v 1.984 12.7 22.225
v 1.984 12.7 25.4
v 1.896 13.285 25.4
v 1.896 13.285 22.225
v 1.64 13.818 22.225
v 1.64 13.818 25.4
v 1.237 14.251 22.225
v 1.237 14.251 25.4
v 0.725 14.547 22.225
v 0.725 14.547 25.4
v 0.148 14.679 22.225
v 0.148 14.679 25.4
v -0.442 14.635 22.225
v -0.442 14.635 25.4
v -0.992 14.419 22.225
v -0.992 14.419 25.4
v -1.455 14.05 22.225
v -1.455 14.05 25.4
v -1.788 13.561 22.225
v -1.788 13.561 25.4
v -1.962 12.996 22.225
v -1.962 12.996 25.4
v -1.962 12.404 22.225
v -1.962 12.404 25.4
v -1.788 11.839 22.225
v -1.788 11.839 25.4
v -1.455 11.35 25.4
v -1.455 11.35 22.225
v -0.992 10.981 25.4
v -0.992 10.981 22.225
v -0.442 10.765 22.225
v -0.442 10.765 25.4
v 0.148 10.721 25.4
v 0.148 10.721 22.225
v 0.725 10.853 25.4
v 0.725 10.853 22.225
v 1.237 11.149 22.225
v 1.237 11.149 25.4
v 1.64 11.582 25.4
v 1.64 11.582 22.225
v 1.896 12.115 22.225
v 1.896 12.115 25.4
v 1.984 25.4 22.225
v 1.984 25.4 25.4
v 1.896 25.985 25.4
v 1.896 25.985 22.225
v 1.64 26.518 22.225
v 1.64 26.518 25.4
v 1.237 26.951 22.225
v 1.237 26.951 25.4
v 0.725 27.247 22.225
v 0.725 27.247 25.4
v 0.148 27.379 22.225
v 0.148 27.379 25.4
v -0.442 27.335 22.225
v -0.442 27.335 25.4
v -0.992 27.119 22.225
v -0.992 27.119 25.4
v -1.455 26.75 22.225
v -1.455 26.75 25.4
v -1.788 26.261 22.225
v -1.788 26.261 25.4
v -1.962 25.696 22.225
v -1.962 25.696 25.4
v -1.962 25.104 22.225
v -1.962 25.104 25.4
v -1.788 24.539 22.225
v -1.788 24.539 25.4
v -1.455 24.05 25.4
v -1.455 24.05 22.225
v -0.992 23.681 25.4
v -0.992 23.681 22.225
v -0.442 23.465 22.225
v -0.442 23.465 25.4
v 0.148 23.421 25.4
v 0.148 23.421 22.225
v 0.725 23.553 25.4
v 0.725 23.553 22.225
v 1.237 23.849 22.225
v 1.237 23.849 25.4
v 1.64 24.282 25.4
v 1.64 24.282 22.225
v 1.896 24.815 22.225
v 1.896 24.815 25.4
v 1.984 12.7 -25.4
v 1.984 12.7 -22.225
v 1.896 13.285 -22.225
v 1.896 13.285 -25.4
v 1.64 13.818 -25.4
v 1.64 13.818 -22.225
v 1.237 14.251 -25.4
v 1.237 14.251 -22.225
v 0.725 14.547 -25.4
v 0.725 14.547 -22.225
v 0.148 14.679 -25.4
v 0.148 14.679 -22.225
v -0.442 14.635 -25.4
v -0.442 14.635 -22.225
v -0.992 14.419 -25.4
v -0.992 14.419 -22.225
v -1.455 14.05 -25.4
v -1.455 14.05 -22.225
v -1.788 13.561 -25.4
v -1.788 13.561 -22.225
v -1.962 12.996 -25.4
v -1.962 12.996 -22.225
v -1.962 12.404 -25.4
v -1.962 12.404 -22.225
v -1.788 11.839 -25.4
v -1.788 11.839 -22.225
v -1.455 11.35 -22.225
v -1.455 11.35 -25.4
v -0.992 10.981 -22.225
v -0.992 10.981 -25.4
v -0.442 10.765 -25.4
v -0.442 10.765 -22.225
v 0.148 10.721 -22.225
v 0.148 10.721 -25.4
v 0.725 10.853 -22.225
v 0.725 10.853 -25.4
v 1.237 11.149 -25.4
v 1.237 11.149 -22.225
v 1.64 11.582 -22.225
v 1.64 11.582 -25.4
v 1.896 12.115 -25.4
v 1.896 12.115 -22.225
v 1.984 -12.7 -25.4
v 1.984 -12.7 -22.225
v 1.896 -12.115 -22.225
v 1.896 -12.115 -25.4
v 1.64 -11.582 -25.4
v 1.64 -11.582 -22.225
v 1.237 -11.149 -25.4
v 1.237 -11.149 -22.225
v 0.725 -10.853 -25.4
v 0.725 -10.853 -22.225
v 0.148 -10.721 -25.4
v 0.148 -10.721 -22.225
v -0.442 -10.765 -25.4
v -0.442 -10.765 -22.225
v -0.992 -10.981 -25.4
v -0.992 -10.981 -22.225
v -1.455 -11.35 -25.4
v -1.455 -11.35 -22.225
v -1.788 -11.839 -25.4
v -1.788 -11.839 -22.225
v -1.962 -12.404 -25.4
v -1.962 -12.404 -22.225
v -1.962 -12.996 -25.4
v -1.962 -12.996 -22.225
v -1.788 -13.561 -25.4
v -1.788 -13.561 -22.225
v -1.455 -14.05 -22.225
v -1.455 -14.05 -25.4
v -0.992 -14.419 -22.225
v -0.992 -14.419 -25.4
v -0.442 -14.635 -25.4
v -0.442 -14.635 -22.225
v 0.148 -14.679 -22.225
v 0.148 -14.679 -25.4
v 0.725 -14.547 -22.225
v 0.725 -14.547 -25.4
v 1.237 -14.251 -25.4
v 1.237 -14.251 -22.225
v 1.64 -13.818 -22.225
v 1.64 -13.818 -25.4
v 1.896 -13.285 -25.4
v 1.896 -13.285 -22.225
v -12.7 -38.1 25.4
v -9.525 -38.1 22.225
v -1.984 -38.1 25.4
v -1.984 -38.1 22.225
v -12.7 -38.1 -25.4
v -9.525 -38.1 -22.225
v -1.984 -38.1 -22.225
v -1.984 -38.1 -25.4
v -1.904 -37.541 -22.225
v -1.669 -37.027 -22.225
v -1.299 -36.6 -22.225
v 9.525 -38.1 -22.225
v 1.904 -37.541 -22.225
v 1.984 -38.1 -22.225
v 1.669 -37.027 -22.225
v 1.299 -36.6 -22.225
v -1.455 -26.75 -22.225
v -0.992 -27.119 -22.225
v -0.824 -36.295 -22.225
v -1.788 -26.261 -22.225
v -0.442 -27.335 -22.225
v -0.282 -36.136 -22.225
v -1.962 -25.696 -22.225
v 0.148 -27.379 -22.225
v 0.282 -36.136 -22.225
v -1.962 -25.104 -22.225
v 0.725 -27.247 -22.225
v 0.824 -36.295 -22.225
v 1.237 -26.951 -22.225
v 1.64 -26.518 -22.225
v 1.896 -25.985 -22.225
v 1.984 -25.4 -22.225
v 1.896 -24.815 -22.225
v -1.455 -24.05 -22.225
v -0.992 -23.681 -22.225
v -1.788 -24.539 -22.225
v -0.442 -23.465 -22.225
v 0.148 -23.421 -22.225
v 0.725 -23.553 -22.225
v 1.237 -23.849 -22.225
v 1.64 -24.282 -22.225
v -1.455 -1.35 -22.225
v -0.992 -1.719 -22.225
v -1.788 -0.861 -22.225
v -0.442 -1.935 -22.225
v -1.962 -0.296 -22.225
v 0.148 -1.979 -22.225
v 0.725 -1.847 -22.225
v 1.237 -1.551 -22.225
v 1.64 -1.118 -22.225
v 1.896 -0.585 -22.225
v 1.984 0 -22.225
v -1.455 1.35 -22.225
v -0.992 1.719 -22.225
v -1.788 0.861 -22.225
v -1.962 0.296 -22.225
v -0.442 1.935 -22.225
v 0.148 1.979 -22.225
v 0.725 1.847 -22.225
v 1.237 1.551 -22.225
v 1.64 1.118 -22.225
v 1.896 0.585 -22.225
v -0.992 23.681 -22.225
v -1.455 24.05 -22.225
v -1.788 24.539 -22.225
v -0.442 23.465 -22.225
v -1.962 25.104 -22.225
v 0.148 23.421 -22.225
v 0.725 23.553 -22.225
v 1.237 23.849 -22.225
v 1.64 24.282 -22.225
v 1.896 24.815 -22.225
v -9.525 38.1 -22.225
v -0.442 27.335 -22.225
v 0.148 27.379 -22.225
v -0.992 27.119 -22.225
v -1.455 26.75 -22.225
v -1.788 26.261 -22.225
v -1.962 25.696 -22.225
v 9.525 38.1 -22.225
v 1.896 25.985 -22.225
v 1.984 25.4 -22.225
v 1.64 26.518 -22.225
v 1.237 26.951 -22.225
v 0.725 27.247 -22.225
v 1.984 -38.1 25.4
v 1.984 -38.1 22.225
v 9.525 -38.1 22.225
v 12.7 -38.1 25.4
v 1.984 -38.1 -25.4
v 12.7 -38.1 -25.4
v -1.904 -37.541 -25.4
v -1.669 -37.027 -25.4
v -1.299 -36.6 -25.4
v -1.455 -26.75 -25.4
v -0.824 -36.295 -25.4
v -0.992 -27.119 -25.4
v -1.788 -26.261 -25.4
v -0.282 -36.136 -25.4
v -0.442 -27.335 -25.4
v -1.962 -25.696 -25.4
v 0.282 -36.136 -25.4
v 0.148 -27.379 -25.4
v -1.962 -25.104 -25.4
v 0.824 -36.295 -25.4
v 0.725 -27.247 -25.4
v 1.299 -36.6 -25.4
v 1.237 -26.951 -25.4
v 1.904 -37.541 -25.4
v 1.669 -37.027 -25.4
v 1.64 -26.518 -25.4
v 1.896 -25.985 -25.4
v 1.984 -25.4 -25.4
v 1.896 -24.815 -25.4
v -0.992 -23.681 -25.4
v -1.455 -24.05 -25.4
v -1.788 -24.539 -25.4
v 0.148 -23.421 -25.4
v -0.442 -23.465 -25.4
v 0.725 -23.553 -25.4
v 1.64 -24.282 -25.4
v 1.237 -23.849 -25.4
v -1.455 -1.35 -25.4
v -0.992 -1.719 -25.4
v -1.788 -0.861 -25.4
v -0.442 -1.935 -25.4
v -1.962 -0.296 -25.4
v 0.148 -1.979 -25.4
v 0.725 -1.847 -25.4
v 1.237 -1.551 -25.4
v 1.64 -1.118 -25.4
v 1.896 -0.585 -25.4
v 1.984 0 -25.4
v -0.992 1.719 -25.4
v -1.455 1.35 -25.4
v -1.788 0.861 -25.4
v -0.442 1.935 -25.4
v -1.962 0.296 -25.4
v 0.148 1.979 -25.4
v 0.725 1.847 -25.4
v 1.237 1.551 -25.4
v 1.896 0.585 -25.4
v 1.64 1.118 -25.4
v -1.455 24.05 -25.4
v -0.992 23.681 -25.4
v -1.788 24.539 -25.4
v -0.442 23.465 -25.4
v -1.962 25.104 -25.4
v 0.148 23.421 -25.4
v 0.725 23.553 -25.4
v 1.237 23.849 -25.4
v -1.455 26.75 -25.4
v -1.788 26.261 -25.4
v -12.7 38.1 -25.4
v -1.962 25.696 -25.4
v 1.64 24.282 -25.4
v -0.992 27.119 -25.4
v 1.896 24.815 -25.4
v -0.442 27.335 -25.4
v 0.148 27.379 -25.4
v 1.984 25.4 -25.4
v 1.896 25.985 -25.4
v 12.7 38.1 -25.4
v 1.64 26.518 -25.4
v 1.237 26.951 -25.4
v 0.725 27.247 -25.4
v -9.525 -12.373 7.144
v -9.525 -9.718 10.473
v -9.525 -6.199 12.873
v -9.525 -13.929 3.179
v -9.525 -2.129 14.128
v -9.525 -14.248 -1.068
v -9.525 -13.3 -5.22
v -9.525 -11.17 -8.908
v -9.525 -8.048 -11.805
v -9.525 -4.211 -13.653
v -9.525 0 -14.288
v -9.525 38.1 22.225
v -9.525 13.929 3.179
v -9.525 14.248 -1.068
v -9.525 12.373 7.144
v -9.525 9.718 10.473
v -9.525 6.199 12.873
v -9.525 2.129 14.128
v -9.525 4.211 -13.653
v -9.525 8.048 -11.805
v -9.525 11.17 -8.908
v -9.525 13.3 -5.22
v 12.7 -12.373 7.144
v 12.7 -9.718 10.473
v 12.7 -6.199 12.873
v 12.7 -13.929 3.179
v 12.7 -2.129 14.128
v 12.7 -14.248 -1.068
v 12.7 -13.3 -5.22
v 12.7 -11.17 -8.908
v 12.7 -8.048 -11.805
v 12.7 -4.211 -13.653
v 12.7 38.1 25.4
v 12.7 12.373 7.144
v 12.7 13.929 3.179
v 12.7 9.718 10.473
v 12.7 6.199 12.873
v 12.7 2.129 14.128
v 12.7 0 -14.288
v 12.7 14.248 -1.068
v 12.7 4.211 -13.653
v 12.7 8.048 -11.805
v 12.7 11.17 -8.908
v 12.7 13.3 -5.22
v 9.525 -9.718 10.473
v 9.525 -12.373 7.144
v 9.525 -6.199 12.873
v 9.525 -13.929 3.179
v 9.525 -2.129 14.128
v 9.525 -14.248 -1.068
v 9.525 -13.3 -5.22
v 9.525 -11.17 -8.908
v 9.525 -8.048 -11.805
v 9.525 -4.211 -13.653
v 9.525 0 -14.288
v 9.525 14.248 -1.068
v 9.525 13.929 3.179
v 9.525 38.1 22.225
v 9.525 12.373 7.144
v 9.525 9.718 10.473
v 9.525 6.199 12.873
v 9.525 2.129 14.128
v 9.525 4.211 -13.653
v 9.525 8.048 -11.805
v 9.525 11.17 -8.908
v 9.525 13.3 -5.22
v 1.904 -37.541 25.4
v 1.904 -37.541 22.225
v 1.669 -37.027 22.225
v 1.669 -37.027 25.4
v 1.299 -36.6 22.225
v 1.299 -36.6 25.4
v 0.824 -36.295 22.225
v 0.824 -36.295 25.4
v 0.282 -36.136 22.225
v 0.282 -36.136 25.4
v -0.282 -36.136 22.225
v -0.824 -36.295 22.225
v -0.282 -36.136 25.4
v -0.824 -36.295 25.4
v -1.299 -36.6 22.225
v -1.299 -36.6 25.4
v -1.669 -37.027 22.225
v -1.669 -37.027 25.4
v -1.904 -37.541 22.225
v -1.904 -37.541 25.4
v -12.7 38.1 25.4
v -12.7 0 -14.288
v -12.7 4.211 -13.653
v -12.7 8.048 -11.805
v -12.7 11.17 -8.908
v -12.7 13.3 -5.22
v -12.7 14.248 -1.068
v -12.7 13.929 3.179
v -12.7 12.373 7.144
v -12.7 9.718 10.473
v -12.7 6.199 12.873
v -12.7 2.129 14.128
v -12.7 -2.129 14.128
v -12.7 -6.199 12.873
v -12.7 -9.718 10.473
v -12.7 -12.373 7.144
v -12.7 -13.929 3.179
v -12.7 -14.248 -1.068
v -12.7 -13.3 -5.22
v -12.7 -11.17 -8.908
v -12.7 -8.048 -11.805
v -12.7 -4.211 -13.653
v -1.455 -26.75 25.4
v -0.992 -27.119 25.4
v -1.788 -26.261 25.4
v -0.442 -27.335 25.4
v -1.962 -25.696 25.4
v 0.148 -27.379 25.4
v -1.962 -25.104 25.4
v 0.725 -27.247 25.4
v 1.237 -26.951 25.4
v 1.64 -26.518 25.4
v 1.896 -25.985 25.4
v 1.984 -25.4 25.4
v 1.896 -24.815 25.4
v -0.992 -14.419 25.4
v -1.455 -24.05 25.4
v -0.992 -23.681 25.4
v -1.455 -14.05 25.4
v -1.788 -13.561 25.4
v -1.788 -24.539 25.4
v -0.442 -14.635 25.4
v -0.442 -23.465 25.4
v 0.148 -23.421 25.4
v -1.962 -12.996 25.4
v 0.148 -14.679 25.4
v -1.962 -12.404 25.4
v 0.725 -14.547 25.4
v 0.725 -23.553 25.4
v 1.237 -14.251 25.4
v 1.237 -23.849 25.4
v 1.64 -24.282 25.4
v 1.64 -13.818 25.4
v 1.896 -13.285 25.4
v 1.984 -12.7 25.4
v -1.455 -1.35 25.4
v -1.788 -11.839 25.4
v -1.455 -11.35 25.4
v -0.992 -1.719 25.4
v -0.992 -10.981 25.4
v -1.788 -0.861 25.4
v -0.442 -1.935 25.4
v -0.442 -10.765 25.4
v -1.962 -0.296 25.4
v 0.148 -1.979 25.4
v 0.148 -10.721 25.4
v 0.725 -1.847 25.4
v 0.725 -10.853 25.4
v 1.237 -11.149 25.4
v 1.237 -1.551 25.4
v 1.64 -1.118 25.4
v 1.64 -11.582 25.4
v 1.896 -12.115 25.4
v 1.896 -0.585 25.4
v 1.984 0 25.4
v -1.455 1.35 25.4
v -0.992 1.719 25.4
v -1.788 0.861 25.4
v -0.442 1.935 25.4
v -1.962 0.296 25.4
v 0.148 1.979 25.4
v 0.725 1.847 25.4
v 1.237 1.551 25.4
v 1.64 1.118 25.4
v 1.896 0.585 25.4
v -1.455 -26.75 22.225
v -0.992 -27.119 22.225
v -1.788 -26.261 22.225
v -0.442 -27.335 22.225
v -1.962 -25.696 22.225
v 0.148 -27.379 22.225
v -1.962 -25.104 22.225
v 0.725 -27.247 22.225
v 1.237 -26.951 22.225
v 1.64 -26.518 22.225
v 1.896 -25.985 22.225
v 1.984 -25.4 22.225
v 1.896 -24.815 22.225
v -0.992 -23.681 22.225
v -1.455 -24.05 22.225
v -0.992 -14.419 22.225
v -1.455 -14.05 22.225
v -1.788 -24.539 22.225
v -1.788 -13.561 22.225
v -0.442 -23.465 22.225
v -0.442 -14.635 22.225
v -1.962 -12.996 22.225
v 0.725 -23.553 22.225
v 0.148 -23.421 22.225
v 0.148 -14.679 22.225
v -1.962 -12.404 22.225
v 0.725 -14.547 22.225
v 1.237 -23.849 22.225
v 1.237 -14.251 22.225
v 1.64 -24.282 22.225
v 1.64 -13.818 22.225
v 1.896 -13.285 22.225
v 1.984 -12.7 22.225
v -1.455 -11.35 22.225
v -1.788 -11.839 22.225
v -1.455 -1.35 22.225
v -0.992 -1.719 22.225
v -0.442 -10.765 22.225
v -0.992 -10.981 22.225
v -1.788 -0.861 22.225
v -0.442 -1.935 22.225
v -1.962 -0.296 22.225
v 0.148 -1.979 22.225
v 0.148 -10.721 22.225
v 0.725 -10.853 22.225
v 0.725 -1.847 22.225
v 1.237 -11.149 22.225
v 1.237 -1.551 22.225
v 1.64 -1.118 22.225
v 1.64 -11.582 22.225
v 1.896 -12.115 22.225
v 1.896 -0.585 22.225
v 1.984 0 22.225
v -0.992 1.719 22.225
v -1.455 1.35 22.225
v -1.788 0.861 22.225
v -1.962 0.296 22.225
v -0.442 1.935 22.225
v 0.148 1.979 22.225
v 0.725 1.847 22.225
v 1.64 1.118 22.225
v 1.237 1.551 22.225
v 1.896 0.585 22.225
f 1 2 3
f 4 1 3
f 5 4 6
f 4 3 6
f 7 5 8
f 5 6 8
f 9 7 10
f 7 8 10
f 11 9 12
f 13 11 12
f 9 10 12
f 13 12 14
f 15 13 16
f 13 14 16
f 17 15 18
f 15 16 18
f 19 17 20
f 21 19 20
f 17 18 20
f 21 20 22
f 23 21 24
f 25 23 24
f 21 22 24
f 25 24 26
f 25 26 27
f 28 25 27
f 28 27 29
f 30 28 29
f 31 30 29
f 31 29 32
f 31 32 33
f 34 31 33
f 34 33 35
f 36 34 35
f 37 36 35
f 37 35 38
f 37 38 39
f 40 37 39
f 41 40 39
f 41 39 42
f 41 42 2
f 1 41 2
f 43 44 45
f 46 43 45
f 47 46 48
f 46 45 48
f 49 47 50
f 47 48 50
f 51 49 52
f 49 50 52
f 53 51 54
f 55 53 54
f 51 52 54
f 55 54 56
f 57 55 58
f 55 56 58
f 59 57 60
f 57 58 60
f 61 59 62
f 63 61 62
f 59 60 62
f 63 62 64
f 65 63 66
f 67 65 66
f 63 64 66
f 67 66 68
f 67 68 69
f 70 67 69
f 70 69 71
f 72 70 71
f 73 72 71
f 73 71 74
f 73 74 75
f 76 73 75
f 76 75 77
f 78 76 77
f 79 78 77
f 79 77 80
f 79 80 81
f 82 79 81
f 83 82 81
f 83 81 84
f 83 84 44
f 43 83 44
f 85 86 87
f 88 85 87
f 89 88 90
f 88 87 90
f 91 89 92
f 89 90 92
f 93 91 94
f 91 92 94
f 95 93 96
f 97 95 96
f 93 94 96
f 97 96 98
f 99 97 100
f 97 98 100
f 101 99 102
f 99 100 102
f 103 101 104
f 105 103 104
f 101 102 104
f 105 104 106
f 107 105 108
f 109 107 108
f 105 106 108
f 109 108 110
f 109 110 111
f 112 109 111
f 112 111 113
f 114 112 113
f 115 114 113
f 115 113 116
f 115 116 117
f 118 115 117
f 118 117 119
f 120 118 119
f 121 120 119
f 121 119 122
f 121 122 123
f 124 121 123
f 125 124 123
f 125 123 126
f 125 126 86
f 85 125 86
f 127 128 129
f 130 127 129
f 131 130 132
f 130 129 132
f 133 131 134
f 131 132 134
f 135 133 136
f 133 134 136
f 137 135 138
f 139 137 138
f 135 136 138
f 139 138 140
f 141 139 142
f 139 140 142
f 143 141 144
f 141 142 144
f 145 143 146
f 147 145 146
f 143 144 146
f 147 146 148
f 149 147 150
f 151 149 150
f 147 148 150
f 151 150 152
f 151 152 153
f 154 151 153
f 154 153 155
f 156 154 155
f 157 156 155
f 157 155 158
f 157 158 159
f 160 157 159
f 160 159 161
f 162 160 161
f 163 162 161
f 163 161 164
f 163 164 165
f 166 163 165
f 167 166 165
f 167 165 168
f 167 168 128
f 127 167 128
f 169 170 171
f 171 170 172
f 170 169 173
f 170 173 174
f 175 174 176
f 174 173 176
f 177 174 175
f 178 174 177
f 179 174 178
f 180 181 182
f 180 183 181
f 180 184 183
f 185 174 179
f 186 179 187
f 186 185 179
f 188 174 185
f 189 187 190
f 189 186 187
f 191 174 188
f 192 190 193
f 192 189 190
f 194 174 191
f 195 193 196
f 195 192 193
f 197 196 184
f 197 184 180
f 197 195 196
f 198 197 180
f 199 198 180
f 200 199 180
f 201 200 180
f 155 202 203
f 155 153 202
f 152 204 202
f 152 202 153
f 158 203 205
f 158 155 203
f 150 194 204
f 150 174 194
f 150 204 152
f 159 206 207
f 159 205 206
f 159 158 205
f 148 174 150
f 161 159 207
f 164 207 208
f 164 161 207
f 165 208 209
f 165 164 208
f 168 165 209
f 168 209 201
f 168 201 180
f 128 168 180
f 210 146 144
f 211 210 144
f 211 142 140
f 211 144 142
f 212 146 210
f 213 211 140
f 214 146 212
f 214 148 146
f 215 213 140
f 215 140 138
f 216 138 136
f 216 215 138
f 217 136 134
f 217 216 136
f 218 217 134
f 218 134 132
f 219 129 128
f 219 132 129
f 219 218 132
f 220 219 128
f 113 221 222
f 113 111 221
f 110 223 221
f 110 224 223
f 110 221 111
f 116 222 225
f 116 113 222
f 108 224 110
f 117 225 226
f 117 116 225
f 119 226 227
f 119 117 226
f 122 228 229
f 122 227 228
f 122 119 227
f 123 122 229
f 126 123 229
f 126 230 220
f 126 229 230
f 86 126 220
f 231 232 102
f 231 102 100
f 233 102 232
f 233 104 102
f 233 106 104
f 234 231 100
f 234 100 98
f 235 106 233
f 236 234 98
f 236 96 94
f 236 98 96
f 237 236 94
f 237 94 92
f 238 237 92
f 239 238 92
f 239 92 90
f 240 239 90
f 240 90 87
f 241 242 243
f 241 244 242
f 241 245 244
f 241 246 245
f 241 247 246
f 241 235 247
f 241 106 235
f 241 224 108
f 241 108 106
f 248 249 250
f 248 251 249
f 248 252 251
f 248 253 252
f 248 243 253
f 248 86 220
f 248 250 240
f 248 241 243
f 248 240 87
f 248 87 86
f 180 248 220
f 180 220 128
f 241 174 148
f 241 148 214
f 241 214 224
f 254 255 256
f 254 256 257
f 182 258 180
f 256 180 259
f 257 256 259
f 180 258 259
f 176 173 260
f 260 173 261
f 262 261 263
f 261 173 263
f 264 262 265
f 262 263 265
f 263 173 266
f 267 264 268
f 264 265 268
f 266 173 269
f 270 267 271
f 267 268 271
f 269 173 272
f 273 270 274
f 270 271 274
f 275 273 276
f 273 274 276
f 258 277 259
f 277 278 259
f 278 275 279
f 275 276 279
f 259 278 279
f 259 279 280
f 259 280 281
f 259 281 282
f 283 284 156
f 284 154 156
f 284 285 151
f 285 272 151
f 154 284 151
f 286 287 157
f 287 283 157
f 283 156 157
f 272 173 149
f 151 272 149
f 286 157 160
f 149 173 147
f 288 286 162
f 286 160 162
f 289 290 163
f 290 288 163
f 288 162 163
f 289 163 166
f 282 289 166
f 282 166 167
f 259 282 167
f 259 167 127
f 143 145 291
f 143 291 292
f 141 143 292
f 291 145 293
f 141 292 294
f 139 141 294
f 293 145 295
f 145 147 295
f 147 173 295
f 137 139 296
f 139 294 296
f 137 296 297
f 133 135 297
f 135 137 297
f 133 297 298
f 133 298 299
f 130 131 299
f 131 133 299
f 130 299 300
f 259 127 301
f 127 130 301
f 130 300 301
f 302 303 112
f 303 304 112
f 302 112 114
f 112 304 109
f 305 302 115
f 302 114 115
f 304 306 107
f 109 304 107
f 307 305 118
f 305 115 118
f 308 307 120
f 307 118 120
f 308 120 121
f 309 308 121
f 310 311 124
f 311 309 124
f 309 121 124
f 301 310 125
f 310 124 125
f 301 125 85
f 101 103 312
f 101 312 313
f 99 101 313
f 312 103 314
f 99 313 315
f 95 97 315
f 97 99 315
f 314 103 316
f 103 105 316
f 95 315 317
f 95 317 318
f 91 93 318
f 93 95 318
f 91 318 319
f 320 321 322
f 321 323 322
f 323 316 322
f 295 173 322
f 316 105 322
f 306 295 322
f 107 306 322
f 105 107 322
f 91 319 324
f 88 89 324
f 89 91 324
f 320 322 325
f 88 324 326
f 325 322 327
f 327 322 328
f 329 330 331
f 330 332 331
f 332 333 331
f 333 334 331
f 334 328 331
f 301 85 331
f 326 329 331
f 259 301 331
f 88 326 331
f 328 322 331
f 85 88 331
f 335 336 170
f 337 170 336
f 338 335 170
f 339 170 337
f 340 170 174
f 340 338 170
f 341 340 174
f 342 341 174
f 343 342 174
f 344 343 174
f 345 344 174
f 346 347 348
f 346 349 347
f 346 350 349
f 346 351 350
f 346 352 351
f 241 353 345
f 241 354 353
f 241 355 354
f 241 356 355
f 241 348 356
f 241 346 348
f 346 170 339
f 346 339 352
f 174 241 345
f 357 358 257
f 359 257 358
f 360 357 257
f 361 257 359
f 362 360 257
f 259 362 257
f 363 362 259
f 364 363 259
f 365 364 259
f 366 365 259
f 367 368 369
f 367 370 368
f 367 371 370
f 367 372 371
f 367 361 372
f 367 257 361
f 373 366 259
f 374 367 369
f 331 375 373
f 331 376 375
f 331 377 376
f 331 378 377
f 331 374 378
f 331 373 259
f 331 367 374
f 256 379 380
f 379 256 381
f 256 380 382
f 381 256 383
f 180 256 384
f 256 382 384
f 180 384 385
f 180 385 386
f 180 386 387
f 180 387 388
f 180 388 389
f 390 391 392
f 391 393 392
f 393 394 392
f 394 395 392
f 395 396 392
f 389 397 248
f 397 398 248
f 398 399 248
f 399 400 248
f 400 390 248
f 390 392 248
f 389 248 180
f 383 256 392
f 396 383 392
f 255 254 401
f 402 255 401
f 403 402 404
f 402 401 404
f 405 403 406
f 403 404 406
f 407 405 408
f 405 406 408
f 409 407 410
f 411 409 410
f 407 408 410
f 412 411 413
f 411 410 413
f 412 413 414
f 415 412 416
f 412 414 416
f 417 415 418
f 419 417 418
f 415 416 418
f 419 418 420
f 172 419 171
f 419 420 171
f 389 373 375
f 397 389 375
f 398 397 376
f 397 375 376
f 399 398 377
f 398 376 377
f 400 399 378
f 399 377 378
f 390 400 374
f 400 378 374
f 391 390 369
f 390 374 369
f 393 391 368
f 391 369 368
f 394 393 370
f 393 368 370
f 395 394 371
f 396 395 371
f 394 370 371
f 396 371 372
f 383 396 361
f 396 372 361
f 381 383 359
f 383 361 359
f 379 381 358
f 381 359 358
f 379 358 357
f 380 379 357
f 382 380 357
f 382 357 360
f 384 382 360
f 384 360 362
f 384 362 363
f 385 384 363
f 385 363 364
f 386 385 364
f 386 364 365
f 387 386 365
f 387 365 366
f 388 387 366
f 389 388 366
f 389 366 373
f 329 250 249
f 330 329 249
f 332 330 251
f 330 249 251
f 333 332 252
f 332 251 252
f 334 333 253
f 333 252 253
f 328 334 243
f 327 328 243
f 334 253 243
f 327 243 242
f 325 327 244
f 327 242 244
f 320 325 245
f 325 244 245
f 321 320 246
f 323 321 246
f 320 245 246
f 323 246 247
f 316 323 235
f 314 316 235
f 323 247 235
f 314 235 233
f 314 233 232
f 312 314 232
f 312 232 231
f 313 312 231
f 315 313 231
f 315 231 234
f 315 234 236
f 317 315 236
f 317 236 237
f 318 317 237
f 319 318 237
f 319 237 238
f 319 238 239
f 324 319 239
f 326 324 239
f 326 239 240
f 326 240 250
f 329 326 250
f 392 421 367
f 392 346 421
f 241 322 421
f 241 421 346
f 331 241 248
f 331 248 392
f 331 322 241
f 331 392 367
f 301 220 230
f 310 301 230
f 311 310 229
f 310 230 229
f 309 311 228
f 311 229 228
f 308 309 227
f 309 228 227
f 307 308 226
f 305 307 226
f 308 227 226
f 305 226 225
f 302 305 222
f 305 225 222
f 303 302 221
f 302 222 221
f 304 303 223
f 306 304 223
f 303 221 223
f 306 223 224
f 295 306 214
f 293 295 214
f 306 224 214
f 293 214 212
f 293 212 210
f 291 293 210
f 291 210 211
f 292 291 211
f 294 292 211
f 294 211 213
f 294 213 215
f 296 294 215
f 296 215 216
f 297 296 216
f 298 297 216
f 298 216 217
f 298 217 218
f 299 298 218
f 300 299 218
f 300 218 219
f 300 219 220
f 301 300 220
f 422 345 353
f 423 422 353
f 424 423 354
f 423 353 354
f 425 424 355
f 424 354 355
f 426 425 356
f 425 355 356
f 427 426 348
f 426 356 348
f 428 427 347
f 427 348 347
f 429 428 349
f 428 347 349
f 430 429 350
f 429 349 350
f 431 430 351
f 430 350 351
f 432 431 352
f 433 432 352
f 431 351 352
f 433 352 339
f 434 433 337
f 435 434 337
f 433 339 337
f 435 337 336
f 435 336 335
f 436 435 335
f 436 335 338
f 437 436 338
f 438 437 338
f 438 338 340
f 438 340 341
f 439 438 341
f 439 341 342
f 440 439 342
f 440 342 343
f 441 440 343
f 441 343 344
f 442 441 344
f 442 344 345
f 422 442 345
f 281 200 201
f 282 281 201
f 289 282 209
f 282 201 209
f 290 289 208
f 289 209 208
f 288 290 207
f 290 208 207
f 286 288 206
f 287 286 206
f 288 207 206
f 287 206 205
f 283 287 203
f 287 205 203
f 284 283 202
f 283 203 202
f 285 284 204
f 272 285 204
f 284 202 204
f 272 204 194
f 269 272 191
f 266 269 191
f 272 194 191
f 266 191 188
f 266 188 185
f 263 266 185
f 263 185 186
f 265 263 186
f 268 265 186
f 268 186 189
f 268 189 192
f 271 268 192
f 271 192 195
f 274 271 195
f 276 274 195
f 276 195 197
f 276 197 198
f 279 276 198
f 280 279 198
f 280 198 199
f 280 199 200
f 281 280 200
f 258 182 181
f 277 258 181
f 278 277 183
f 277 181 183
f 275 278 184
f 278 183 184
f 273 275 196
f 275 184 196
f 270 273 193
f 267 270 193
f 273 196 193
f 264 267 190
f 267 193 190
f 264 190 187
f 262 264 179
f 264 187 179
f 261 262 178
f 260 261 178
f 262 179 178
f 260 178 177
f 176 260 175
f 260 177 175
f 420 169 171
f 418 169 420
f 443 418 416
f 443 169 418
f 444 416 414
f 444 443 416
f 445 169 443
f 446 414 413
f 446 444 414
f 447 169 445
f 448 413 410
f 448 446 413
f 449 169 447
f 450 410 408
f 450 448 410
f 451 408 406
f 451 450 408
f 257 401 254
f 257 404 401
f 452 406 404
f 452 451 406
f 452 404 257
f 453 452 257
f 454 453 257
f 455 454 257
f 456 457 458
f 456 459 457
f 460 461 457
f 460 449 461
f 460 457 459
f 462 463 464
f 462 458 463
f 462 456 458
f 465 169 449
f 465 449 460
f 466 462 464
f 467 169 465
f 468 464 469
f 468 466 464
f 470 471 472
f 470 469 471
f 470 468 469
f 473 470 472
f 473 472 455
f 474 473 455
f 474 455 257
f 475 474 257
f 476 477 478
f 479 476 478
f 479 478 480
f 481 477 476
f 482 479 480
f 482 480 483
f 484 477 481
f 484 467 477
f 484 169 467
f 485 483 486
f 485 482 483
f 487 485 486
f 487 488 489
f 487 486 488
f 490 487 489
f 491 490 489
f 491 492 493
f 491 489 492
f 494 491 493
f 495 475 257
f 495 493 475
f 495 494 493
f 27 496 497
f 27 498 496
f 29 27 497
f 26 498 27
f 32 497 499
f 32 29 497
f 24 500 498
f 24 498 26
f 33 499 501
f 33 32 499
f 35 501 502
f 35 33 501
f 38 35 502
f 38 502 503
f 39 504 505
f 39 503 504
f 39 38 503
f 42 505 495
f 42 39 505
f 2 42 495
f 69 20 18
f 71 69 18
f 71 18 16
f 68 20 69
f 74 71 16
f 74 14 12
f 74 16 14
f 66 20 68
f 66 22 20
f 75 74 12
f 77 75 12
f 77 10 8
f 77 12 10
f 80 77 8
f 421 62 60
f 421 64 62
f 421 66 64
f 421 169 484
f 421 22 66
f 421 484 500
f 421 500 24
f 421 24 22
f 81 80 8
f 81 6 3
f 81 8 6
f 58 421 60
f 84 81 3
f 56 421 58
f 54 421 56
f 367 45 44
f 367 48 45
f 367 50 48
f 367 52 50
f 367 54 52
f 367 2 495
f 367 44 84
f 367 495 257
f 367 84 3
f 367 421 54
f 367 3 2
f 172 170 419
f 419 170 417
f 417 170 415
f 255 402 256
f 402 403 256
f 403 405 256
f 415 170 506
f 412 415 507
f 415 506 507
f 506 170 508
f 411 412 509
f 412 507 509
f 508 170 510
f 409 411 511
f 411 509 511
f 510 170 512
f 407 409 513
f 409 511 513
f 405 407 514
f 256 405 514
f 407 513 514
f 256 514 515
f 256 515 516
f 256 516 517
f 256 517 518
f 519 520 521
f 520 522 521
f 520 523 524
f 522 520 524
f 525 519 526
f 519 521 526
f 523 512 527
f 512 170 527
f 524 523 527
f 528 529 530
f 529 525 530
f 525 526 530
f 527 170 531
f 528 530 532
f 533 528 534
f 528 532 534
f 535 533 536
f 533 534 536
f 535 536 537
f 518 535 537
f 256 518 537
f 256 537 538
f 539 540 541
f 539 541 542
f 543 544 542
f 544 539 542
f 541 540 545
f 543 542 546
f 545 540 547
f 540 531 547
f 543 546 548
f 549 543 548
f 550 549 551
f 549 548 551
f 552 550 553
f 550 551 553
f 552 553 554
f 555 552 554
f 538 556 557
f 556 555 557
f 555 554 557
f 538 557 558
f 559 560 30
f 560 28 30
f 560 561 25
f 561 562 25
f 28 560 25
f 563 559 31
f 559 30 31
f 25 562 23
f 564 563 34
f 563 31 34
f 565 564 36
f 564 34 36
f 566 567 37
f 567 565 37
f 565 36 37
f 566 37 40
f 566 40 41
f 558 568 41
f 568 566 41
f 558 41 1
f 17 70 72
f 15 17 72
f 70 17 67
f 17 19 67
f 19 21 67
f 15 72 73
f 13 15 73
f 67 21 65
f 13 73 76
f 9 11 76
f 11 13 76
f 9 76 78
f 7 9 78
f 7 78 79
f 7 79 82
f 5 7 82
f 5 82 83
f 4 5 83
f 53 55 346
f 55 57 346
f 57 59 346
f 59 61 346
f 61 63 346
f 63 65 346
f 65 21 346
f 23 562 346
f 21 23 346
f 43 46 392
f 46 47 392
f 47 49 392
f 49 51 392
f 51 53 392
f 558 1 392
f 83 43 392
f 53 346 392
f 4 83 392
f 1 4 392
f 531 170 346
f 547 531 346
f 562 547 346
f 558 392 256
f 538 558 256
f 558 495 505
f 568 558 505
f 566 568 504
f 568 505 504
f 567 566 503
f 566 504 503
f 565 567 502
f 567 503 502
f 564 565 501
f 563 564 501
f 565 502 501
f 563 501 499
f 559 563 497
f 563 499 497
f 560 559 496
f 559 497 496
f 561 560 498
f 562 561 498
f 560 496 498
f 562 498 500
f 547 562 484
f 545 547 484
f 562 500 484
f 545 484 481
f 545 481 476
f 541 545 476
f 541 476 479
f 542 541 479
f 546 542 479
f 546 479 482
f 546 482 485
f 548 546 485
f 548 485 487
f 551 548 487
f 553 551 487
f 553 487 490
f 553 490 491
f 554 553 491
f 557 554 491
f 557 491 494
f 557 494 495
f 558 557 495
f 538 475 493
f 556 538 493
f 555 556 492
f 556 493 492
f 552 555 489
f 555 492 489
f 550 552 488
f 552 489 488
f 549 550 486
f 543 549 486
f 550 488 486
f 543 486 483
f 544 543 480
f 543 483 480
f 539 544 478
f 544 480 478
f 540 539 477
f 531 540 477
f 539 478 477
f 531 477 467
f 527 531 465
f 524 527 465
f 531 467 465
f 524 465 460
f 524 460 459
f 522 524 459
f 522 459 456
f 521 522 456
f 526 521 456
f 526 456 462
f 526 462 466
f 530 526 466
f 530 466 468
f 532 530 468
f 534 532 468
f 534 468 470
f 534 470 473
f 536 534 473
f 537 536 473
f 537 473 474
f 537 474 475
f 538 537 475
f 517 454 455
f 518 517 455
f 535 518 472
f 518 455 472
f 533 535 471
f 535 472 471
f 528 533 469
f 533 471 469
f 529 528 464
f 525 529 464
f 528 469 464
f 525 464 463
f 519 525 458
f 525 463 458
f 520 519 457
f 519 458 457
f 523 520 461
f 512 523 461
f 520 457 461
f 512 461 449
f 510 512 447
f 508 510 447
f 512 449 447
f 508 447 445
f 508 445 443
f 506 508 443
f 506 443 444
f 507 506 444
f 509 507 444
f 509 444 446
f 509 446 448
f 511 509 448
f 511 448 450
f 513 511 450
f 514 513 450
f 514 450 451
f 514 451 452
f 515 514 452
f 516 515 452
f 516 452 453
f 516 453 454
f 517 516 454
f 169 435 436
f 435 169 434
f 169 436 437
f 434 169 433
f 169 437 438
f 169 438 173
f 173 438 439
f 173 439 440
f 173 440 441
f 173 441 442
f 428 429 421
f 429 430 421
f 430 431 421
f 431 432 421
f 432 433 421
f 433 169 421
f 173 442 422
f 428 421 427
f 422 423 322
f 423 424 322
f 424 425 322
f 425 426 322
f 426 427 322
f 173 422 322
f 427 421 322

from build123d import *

# Parameters (mm, degrees)
SKETCH1_W                       = 25.4
SKETCH1_H                       = 50.8
SKETCH1_W_2                     = 19.05
SKETCH1_H_2                     = 44.45
BOSS_EXTRUDE1_DEPTH             = 38.1
F_5_32_0_15625_DIAMETER_HOLE1_D = 3.96875
SKETCH5_R                       = 14.2875
CUT_EXTRUDE1_DEPTH              = 53.363441445


with BuildPart() as part:
    # Sketch1 → Boss-Extrude1 (new, symmetric)
    with BuildSketch(Plane(origin=(0, 0, 0), x_dir=(1, 0, 0), z_dir=(0, 1, 0))):
        Rectangle(SKETCH1_W, SKETCH1_H)
        Rectangle(SKETCH1_W_2, SKETCH1_H_2, mode=Mode.SUBTRACT)
    extrude(amount=BOSS_EXTRUDE1_DEPTH, both=True)

    # 5/32 (0.15625) Diameter Hole1 (through all)
    with Locations(Plane(origin=(0, 0, -25.4), x_dir=(-1, 0, 0), z_dir=(0, 0, -1))):
        with Locations((0, 25.4), (0, 12.7), (0, 0), (0, -12.7), (0, -25.4), (0, -38.1), (0, -50.8), (0, -63.5), (0, -76.2), (0, -88.9), (0, -101.6), (0, -114.3), (0, -127), (0, -139.7), (0, -152.4), (0, -165.1), (0, -177.8), (0, -190.5), (0, -203.2), (0, -215.9), (0, -228.6), (0, -241.3), (0, -254), (0, -266.7), (0, -279.4), (0, -292.1), (0, -304.8), (0, -317.5), (0, -330.2), (0, -342.9), (0, -355.6), (0, -368.3), (0, -381), (0, -393.7), (0, -406.4), (0, -419.1), (0, -431.8), (0, -444.5), (0, -457.2), (0, -469.9), (0, -482.6), (0, -495.3), (0, -508), (0, -520.7), (0, -533.4), (0, -546.1), (0, -558.8), (0, -571.5), (0, -584.2), (0, -596.9), (0, -609.6), (0, -622.3), (0, -635), (0, -647.7), (0, -660.4), (0, -673.1), (0, -685.8), (0, -698.5), (0, -711.2), (0, -723.9), (0, -736.6), (0, -749.3), (0, -762), (0, -774.7), (0, -787.4), (0, -800.1), (0, -812.8), (0, -825.5), (0, -838.2)):
            Hole(F_5_32_0_15625_DIAMETER_HOLE1_D / 2)

    # Sketch5 → Cut-Extrude1 (cut, through all)
    with BuildSketch(Plane(origin=(12.7, 0, 0), x_dir=(0, 0, -1), z_dir=(1, 0, 0))):
        Circle(SKETCH5_R)
    extrude(amount=-CUT_EXTRUDE1_DEPTH, mode=Mode.SUBTRACT)


solid = part.part
